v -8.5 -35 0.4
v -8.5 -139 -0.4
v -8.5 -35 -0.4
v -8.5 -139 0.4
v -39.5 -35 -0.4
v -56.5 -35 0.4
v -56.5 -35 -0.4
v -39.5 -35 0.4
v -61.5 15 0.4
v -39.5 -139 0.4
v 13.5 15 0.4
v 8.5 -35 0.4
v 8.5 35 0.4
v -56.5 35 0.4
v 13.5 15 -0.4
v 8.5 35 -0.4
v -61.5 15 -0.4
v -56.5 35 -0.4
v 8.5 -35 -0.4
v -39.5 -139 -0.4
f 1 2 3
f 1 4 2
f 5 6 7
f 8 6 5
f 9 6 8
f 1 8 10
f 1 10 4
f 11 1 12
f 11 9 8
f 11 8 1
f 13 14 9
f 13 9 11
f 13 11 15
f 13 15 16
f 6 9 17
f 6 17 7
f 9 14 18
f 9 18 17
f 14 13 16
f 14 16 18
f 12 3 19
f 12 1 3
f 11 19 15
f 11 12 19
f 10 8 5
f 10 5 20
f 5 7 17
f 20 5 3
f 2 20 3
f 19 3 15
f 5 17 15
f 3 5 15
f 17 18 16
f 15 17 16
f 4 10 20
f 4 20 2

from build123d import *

# Parameters (mm, degrees)
F0_W     = 31
F0_H     = 70
F0_H_2   = 17
F0_H_3   = 50
F0_H_4   = 20
F1_DEPTH = 0.4


with BuildPart() as f1:
    # F0 (on Top) → F1 (new body, symmetric)
    with BuildSketch(Plane.XY):
        Polygon((-8.5, -35), (8.5, -35), (13.5, 15), (8.5, 35), (-8.5, 35), align=None)
        with Locations((-24, 0)):
            Rectangle(F0_W, F0_H)
        with Locations((-24, -43.5)):
            Rectangle(F0_W, F0_H_2)
        Polygon((-56.5, -35), (-39.5, -35), (-39.5, 35), (-56.5, 35), (-61.5, 15), align=None)
        with Locations((-24, -77)):
            Rectangle(F0_W, F0_H_3)
        with Locations((-24, -112)):
            Rectangle(F0_W, F0_H_4)
        with Locations((-24, -130.5)):
            Rectangle(F0_W, F0_H_2)
    extrude(amount=F1_DEPTH, both=True)


solid = f1.part
